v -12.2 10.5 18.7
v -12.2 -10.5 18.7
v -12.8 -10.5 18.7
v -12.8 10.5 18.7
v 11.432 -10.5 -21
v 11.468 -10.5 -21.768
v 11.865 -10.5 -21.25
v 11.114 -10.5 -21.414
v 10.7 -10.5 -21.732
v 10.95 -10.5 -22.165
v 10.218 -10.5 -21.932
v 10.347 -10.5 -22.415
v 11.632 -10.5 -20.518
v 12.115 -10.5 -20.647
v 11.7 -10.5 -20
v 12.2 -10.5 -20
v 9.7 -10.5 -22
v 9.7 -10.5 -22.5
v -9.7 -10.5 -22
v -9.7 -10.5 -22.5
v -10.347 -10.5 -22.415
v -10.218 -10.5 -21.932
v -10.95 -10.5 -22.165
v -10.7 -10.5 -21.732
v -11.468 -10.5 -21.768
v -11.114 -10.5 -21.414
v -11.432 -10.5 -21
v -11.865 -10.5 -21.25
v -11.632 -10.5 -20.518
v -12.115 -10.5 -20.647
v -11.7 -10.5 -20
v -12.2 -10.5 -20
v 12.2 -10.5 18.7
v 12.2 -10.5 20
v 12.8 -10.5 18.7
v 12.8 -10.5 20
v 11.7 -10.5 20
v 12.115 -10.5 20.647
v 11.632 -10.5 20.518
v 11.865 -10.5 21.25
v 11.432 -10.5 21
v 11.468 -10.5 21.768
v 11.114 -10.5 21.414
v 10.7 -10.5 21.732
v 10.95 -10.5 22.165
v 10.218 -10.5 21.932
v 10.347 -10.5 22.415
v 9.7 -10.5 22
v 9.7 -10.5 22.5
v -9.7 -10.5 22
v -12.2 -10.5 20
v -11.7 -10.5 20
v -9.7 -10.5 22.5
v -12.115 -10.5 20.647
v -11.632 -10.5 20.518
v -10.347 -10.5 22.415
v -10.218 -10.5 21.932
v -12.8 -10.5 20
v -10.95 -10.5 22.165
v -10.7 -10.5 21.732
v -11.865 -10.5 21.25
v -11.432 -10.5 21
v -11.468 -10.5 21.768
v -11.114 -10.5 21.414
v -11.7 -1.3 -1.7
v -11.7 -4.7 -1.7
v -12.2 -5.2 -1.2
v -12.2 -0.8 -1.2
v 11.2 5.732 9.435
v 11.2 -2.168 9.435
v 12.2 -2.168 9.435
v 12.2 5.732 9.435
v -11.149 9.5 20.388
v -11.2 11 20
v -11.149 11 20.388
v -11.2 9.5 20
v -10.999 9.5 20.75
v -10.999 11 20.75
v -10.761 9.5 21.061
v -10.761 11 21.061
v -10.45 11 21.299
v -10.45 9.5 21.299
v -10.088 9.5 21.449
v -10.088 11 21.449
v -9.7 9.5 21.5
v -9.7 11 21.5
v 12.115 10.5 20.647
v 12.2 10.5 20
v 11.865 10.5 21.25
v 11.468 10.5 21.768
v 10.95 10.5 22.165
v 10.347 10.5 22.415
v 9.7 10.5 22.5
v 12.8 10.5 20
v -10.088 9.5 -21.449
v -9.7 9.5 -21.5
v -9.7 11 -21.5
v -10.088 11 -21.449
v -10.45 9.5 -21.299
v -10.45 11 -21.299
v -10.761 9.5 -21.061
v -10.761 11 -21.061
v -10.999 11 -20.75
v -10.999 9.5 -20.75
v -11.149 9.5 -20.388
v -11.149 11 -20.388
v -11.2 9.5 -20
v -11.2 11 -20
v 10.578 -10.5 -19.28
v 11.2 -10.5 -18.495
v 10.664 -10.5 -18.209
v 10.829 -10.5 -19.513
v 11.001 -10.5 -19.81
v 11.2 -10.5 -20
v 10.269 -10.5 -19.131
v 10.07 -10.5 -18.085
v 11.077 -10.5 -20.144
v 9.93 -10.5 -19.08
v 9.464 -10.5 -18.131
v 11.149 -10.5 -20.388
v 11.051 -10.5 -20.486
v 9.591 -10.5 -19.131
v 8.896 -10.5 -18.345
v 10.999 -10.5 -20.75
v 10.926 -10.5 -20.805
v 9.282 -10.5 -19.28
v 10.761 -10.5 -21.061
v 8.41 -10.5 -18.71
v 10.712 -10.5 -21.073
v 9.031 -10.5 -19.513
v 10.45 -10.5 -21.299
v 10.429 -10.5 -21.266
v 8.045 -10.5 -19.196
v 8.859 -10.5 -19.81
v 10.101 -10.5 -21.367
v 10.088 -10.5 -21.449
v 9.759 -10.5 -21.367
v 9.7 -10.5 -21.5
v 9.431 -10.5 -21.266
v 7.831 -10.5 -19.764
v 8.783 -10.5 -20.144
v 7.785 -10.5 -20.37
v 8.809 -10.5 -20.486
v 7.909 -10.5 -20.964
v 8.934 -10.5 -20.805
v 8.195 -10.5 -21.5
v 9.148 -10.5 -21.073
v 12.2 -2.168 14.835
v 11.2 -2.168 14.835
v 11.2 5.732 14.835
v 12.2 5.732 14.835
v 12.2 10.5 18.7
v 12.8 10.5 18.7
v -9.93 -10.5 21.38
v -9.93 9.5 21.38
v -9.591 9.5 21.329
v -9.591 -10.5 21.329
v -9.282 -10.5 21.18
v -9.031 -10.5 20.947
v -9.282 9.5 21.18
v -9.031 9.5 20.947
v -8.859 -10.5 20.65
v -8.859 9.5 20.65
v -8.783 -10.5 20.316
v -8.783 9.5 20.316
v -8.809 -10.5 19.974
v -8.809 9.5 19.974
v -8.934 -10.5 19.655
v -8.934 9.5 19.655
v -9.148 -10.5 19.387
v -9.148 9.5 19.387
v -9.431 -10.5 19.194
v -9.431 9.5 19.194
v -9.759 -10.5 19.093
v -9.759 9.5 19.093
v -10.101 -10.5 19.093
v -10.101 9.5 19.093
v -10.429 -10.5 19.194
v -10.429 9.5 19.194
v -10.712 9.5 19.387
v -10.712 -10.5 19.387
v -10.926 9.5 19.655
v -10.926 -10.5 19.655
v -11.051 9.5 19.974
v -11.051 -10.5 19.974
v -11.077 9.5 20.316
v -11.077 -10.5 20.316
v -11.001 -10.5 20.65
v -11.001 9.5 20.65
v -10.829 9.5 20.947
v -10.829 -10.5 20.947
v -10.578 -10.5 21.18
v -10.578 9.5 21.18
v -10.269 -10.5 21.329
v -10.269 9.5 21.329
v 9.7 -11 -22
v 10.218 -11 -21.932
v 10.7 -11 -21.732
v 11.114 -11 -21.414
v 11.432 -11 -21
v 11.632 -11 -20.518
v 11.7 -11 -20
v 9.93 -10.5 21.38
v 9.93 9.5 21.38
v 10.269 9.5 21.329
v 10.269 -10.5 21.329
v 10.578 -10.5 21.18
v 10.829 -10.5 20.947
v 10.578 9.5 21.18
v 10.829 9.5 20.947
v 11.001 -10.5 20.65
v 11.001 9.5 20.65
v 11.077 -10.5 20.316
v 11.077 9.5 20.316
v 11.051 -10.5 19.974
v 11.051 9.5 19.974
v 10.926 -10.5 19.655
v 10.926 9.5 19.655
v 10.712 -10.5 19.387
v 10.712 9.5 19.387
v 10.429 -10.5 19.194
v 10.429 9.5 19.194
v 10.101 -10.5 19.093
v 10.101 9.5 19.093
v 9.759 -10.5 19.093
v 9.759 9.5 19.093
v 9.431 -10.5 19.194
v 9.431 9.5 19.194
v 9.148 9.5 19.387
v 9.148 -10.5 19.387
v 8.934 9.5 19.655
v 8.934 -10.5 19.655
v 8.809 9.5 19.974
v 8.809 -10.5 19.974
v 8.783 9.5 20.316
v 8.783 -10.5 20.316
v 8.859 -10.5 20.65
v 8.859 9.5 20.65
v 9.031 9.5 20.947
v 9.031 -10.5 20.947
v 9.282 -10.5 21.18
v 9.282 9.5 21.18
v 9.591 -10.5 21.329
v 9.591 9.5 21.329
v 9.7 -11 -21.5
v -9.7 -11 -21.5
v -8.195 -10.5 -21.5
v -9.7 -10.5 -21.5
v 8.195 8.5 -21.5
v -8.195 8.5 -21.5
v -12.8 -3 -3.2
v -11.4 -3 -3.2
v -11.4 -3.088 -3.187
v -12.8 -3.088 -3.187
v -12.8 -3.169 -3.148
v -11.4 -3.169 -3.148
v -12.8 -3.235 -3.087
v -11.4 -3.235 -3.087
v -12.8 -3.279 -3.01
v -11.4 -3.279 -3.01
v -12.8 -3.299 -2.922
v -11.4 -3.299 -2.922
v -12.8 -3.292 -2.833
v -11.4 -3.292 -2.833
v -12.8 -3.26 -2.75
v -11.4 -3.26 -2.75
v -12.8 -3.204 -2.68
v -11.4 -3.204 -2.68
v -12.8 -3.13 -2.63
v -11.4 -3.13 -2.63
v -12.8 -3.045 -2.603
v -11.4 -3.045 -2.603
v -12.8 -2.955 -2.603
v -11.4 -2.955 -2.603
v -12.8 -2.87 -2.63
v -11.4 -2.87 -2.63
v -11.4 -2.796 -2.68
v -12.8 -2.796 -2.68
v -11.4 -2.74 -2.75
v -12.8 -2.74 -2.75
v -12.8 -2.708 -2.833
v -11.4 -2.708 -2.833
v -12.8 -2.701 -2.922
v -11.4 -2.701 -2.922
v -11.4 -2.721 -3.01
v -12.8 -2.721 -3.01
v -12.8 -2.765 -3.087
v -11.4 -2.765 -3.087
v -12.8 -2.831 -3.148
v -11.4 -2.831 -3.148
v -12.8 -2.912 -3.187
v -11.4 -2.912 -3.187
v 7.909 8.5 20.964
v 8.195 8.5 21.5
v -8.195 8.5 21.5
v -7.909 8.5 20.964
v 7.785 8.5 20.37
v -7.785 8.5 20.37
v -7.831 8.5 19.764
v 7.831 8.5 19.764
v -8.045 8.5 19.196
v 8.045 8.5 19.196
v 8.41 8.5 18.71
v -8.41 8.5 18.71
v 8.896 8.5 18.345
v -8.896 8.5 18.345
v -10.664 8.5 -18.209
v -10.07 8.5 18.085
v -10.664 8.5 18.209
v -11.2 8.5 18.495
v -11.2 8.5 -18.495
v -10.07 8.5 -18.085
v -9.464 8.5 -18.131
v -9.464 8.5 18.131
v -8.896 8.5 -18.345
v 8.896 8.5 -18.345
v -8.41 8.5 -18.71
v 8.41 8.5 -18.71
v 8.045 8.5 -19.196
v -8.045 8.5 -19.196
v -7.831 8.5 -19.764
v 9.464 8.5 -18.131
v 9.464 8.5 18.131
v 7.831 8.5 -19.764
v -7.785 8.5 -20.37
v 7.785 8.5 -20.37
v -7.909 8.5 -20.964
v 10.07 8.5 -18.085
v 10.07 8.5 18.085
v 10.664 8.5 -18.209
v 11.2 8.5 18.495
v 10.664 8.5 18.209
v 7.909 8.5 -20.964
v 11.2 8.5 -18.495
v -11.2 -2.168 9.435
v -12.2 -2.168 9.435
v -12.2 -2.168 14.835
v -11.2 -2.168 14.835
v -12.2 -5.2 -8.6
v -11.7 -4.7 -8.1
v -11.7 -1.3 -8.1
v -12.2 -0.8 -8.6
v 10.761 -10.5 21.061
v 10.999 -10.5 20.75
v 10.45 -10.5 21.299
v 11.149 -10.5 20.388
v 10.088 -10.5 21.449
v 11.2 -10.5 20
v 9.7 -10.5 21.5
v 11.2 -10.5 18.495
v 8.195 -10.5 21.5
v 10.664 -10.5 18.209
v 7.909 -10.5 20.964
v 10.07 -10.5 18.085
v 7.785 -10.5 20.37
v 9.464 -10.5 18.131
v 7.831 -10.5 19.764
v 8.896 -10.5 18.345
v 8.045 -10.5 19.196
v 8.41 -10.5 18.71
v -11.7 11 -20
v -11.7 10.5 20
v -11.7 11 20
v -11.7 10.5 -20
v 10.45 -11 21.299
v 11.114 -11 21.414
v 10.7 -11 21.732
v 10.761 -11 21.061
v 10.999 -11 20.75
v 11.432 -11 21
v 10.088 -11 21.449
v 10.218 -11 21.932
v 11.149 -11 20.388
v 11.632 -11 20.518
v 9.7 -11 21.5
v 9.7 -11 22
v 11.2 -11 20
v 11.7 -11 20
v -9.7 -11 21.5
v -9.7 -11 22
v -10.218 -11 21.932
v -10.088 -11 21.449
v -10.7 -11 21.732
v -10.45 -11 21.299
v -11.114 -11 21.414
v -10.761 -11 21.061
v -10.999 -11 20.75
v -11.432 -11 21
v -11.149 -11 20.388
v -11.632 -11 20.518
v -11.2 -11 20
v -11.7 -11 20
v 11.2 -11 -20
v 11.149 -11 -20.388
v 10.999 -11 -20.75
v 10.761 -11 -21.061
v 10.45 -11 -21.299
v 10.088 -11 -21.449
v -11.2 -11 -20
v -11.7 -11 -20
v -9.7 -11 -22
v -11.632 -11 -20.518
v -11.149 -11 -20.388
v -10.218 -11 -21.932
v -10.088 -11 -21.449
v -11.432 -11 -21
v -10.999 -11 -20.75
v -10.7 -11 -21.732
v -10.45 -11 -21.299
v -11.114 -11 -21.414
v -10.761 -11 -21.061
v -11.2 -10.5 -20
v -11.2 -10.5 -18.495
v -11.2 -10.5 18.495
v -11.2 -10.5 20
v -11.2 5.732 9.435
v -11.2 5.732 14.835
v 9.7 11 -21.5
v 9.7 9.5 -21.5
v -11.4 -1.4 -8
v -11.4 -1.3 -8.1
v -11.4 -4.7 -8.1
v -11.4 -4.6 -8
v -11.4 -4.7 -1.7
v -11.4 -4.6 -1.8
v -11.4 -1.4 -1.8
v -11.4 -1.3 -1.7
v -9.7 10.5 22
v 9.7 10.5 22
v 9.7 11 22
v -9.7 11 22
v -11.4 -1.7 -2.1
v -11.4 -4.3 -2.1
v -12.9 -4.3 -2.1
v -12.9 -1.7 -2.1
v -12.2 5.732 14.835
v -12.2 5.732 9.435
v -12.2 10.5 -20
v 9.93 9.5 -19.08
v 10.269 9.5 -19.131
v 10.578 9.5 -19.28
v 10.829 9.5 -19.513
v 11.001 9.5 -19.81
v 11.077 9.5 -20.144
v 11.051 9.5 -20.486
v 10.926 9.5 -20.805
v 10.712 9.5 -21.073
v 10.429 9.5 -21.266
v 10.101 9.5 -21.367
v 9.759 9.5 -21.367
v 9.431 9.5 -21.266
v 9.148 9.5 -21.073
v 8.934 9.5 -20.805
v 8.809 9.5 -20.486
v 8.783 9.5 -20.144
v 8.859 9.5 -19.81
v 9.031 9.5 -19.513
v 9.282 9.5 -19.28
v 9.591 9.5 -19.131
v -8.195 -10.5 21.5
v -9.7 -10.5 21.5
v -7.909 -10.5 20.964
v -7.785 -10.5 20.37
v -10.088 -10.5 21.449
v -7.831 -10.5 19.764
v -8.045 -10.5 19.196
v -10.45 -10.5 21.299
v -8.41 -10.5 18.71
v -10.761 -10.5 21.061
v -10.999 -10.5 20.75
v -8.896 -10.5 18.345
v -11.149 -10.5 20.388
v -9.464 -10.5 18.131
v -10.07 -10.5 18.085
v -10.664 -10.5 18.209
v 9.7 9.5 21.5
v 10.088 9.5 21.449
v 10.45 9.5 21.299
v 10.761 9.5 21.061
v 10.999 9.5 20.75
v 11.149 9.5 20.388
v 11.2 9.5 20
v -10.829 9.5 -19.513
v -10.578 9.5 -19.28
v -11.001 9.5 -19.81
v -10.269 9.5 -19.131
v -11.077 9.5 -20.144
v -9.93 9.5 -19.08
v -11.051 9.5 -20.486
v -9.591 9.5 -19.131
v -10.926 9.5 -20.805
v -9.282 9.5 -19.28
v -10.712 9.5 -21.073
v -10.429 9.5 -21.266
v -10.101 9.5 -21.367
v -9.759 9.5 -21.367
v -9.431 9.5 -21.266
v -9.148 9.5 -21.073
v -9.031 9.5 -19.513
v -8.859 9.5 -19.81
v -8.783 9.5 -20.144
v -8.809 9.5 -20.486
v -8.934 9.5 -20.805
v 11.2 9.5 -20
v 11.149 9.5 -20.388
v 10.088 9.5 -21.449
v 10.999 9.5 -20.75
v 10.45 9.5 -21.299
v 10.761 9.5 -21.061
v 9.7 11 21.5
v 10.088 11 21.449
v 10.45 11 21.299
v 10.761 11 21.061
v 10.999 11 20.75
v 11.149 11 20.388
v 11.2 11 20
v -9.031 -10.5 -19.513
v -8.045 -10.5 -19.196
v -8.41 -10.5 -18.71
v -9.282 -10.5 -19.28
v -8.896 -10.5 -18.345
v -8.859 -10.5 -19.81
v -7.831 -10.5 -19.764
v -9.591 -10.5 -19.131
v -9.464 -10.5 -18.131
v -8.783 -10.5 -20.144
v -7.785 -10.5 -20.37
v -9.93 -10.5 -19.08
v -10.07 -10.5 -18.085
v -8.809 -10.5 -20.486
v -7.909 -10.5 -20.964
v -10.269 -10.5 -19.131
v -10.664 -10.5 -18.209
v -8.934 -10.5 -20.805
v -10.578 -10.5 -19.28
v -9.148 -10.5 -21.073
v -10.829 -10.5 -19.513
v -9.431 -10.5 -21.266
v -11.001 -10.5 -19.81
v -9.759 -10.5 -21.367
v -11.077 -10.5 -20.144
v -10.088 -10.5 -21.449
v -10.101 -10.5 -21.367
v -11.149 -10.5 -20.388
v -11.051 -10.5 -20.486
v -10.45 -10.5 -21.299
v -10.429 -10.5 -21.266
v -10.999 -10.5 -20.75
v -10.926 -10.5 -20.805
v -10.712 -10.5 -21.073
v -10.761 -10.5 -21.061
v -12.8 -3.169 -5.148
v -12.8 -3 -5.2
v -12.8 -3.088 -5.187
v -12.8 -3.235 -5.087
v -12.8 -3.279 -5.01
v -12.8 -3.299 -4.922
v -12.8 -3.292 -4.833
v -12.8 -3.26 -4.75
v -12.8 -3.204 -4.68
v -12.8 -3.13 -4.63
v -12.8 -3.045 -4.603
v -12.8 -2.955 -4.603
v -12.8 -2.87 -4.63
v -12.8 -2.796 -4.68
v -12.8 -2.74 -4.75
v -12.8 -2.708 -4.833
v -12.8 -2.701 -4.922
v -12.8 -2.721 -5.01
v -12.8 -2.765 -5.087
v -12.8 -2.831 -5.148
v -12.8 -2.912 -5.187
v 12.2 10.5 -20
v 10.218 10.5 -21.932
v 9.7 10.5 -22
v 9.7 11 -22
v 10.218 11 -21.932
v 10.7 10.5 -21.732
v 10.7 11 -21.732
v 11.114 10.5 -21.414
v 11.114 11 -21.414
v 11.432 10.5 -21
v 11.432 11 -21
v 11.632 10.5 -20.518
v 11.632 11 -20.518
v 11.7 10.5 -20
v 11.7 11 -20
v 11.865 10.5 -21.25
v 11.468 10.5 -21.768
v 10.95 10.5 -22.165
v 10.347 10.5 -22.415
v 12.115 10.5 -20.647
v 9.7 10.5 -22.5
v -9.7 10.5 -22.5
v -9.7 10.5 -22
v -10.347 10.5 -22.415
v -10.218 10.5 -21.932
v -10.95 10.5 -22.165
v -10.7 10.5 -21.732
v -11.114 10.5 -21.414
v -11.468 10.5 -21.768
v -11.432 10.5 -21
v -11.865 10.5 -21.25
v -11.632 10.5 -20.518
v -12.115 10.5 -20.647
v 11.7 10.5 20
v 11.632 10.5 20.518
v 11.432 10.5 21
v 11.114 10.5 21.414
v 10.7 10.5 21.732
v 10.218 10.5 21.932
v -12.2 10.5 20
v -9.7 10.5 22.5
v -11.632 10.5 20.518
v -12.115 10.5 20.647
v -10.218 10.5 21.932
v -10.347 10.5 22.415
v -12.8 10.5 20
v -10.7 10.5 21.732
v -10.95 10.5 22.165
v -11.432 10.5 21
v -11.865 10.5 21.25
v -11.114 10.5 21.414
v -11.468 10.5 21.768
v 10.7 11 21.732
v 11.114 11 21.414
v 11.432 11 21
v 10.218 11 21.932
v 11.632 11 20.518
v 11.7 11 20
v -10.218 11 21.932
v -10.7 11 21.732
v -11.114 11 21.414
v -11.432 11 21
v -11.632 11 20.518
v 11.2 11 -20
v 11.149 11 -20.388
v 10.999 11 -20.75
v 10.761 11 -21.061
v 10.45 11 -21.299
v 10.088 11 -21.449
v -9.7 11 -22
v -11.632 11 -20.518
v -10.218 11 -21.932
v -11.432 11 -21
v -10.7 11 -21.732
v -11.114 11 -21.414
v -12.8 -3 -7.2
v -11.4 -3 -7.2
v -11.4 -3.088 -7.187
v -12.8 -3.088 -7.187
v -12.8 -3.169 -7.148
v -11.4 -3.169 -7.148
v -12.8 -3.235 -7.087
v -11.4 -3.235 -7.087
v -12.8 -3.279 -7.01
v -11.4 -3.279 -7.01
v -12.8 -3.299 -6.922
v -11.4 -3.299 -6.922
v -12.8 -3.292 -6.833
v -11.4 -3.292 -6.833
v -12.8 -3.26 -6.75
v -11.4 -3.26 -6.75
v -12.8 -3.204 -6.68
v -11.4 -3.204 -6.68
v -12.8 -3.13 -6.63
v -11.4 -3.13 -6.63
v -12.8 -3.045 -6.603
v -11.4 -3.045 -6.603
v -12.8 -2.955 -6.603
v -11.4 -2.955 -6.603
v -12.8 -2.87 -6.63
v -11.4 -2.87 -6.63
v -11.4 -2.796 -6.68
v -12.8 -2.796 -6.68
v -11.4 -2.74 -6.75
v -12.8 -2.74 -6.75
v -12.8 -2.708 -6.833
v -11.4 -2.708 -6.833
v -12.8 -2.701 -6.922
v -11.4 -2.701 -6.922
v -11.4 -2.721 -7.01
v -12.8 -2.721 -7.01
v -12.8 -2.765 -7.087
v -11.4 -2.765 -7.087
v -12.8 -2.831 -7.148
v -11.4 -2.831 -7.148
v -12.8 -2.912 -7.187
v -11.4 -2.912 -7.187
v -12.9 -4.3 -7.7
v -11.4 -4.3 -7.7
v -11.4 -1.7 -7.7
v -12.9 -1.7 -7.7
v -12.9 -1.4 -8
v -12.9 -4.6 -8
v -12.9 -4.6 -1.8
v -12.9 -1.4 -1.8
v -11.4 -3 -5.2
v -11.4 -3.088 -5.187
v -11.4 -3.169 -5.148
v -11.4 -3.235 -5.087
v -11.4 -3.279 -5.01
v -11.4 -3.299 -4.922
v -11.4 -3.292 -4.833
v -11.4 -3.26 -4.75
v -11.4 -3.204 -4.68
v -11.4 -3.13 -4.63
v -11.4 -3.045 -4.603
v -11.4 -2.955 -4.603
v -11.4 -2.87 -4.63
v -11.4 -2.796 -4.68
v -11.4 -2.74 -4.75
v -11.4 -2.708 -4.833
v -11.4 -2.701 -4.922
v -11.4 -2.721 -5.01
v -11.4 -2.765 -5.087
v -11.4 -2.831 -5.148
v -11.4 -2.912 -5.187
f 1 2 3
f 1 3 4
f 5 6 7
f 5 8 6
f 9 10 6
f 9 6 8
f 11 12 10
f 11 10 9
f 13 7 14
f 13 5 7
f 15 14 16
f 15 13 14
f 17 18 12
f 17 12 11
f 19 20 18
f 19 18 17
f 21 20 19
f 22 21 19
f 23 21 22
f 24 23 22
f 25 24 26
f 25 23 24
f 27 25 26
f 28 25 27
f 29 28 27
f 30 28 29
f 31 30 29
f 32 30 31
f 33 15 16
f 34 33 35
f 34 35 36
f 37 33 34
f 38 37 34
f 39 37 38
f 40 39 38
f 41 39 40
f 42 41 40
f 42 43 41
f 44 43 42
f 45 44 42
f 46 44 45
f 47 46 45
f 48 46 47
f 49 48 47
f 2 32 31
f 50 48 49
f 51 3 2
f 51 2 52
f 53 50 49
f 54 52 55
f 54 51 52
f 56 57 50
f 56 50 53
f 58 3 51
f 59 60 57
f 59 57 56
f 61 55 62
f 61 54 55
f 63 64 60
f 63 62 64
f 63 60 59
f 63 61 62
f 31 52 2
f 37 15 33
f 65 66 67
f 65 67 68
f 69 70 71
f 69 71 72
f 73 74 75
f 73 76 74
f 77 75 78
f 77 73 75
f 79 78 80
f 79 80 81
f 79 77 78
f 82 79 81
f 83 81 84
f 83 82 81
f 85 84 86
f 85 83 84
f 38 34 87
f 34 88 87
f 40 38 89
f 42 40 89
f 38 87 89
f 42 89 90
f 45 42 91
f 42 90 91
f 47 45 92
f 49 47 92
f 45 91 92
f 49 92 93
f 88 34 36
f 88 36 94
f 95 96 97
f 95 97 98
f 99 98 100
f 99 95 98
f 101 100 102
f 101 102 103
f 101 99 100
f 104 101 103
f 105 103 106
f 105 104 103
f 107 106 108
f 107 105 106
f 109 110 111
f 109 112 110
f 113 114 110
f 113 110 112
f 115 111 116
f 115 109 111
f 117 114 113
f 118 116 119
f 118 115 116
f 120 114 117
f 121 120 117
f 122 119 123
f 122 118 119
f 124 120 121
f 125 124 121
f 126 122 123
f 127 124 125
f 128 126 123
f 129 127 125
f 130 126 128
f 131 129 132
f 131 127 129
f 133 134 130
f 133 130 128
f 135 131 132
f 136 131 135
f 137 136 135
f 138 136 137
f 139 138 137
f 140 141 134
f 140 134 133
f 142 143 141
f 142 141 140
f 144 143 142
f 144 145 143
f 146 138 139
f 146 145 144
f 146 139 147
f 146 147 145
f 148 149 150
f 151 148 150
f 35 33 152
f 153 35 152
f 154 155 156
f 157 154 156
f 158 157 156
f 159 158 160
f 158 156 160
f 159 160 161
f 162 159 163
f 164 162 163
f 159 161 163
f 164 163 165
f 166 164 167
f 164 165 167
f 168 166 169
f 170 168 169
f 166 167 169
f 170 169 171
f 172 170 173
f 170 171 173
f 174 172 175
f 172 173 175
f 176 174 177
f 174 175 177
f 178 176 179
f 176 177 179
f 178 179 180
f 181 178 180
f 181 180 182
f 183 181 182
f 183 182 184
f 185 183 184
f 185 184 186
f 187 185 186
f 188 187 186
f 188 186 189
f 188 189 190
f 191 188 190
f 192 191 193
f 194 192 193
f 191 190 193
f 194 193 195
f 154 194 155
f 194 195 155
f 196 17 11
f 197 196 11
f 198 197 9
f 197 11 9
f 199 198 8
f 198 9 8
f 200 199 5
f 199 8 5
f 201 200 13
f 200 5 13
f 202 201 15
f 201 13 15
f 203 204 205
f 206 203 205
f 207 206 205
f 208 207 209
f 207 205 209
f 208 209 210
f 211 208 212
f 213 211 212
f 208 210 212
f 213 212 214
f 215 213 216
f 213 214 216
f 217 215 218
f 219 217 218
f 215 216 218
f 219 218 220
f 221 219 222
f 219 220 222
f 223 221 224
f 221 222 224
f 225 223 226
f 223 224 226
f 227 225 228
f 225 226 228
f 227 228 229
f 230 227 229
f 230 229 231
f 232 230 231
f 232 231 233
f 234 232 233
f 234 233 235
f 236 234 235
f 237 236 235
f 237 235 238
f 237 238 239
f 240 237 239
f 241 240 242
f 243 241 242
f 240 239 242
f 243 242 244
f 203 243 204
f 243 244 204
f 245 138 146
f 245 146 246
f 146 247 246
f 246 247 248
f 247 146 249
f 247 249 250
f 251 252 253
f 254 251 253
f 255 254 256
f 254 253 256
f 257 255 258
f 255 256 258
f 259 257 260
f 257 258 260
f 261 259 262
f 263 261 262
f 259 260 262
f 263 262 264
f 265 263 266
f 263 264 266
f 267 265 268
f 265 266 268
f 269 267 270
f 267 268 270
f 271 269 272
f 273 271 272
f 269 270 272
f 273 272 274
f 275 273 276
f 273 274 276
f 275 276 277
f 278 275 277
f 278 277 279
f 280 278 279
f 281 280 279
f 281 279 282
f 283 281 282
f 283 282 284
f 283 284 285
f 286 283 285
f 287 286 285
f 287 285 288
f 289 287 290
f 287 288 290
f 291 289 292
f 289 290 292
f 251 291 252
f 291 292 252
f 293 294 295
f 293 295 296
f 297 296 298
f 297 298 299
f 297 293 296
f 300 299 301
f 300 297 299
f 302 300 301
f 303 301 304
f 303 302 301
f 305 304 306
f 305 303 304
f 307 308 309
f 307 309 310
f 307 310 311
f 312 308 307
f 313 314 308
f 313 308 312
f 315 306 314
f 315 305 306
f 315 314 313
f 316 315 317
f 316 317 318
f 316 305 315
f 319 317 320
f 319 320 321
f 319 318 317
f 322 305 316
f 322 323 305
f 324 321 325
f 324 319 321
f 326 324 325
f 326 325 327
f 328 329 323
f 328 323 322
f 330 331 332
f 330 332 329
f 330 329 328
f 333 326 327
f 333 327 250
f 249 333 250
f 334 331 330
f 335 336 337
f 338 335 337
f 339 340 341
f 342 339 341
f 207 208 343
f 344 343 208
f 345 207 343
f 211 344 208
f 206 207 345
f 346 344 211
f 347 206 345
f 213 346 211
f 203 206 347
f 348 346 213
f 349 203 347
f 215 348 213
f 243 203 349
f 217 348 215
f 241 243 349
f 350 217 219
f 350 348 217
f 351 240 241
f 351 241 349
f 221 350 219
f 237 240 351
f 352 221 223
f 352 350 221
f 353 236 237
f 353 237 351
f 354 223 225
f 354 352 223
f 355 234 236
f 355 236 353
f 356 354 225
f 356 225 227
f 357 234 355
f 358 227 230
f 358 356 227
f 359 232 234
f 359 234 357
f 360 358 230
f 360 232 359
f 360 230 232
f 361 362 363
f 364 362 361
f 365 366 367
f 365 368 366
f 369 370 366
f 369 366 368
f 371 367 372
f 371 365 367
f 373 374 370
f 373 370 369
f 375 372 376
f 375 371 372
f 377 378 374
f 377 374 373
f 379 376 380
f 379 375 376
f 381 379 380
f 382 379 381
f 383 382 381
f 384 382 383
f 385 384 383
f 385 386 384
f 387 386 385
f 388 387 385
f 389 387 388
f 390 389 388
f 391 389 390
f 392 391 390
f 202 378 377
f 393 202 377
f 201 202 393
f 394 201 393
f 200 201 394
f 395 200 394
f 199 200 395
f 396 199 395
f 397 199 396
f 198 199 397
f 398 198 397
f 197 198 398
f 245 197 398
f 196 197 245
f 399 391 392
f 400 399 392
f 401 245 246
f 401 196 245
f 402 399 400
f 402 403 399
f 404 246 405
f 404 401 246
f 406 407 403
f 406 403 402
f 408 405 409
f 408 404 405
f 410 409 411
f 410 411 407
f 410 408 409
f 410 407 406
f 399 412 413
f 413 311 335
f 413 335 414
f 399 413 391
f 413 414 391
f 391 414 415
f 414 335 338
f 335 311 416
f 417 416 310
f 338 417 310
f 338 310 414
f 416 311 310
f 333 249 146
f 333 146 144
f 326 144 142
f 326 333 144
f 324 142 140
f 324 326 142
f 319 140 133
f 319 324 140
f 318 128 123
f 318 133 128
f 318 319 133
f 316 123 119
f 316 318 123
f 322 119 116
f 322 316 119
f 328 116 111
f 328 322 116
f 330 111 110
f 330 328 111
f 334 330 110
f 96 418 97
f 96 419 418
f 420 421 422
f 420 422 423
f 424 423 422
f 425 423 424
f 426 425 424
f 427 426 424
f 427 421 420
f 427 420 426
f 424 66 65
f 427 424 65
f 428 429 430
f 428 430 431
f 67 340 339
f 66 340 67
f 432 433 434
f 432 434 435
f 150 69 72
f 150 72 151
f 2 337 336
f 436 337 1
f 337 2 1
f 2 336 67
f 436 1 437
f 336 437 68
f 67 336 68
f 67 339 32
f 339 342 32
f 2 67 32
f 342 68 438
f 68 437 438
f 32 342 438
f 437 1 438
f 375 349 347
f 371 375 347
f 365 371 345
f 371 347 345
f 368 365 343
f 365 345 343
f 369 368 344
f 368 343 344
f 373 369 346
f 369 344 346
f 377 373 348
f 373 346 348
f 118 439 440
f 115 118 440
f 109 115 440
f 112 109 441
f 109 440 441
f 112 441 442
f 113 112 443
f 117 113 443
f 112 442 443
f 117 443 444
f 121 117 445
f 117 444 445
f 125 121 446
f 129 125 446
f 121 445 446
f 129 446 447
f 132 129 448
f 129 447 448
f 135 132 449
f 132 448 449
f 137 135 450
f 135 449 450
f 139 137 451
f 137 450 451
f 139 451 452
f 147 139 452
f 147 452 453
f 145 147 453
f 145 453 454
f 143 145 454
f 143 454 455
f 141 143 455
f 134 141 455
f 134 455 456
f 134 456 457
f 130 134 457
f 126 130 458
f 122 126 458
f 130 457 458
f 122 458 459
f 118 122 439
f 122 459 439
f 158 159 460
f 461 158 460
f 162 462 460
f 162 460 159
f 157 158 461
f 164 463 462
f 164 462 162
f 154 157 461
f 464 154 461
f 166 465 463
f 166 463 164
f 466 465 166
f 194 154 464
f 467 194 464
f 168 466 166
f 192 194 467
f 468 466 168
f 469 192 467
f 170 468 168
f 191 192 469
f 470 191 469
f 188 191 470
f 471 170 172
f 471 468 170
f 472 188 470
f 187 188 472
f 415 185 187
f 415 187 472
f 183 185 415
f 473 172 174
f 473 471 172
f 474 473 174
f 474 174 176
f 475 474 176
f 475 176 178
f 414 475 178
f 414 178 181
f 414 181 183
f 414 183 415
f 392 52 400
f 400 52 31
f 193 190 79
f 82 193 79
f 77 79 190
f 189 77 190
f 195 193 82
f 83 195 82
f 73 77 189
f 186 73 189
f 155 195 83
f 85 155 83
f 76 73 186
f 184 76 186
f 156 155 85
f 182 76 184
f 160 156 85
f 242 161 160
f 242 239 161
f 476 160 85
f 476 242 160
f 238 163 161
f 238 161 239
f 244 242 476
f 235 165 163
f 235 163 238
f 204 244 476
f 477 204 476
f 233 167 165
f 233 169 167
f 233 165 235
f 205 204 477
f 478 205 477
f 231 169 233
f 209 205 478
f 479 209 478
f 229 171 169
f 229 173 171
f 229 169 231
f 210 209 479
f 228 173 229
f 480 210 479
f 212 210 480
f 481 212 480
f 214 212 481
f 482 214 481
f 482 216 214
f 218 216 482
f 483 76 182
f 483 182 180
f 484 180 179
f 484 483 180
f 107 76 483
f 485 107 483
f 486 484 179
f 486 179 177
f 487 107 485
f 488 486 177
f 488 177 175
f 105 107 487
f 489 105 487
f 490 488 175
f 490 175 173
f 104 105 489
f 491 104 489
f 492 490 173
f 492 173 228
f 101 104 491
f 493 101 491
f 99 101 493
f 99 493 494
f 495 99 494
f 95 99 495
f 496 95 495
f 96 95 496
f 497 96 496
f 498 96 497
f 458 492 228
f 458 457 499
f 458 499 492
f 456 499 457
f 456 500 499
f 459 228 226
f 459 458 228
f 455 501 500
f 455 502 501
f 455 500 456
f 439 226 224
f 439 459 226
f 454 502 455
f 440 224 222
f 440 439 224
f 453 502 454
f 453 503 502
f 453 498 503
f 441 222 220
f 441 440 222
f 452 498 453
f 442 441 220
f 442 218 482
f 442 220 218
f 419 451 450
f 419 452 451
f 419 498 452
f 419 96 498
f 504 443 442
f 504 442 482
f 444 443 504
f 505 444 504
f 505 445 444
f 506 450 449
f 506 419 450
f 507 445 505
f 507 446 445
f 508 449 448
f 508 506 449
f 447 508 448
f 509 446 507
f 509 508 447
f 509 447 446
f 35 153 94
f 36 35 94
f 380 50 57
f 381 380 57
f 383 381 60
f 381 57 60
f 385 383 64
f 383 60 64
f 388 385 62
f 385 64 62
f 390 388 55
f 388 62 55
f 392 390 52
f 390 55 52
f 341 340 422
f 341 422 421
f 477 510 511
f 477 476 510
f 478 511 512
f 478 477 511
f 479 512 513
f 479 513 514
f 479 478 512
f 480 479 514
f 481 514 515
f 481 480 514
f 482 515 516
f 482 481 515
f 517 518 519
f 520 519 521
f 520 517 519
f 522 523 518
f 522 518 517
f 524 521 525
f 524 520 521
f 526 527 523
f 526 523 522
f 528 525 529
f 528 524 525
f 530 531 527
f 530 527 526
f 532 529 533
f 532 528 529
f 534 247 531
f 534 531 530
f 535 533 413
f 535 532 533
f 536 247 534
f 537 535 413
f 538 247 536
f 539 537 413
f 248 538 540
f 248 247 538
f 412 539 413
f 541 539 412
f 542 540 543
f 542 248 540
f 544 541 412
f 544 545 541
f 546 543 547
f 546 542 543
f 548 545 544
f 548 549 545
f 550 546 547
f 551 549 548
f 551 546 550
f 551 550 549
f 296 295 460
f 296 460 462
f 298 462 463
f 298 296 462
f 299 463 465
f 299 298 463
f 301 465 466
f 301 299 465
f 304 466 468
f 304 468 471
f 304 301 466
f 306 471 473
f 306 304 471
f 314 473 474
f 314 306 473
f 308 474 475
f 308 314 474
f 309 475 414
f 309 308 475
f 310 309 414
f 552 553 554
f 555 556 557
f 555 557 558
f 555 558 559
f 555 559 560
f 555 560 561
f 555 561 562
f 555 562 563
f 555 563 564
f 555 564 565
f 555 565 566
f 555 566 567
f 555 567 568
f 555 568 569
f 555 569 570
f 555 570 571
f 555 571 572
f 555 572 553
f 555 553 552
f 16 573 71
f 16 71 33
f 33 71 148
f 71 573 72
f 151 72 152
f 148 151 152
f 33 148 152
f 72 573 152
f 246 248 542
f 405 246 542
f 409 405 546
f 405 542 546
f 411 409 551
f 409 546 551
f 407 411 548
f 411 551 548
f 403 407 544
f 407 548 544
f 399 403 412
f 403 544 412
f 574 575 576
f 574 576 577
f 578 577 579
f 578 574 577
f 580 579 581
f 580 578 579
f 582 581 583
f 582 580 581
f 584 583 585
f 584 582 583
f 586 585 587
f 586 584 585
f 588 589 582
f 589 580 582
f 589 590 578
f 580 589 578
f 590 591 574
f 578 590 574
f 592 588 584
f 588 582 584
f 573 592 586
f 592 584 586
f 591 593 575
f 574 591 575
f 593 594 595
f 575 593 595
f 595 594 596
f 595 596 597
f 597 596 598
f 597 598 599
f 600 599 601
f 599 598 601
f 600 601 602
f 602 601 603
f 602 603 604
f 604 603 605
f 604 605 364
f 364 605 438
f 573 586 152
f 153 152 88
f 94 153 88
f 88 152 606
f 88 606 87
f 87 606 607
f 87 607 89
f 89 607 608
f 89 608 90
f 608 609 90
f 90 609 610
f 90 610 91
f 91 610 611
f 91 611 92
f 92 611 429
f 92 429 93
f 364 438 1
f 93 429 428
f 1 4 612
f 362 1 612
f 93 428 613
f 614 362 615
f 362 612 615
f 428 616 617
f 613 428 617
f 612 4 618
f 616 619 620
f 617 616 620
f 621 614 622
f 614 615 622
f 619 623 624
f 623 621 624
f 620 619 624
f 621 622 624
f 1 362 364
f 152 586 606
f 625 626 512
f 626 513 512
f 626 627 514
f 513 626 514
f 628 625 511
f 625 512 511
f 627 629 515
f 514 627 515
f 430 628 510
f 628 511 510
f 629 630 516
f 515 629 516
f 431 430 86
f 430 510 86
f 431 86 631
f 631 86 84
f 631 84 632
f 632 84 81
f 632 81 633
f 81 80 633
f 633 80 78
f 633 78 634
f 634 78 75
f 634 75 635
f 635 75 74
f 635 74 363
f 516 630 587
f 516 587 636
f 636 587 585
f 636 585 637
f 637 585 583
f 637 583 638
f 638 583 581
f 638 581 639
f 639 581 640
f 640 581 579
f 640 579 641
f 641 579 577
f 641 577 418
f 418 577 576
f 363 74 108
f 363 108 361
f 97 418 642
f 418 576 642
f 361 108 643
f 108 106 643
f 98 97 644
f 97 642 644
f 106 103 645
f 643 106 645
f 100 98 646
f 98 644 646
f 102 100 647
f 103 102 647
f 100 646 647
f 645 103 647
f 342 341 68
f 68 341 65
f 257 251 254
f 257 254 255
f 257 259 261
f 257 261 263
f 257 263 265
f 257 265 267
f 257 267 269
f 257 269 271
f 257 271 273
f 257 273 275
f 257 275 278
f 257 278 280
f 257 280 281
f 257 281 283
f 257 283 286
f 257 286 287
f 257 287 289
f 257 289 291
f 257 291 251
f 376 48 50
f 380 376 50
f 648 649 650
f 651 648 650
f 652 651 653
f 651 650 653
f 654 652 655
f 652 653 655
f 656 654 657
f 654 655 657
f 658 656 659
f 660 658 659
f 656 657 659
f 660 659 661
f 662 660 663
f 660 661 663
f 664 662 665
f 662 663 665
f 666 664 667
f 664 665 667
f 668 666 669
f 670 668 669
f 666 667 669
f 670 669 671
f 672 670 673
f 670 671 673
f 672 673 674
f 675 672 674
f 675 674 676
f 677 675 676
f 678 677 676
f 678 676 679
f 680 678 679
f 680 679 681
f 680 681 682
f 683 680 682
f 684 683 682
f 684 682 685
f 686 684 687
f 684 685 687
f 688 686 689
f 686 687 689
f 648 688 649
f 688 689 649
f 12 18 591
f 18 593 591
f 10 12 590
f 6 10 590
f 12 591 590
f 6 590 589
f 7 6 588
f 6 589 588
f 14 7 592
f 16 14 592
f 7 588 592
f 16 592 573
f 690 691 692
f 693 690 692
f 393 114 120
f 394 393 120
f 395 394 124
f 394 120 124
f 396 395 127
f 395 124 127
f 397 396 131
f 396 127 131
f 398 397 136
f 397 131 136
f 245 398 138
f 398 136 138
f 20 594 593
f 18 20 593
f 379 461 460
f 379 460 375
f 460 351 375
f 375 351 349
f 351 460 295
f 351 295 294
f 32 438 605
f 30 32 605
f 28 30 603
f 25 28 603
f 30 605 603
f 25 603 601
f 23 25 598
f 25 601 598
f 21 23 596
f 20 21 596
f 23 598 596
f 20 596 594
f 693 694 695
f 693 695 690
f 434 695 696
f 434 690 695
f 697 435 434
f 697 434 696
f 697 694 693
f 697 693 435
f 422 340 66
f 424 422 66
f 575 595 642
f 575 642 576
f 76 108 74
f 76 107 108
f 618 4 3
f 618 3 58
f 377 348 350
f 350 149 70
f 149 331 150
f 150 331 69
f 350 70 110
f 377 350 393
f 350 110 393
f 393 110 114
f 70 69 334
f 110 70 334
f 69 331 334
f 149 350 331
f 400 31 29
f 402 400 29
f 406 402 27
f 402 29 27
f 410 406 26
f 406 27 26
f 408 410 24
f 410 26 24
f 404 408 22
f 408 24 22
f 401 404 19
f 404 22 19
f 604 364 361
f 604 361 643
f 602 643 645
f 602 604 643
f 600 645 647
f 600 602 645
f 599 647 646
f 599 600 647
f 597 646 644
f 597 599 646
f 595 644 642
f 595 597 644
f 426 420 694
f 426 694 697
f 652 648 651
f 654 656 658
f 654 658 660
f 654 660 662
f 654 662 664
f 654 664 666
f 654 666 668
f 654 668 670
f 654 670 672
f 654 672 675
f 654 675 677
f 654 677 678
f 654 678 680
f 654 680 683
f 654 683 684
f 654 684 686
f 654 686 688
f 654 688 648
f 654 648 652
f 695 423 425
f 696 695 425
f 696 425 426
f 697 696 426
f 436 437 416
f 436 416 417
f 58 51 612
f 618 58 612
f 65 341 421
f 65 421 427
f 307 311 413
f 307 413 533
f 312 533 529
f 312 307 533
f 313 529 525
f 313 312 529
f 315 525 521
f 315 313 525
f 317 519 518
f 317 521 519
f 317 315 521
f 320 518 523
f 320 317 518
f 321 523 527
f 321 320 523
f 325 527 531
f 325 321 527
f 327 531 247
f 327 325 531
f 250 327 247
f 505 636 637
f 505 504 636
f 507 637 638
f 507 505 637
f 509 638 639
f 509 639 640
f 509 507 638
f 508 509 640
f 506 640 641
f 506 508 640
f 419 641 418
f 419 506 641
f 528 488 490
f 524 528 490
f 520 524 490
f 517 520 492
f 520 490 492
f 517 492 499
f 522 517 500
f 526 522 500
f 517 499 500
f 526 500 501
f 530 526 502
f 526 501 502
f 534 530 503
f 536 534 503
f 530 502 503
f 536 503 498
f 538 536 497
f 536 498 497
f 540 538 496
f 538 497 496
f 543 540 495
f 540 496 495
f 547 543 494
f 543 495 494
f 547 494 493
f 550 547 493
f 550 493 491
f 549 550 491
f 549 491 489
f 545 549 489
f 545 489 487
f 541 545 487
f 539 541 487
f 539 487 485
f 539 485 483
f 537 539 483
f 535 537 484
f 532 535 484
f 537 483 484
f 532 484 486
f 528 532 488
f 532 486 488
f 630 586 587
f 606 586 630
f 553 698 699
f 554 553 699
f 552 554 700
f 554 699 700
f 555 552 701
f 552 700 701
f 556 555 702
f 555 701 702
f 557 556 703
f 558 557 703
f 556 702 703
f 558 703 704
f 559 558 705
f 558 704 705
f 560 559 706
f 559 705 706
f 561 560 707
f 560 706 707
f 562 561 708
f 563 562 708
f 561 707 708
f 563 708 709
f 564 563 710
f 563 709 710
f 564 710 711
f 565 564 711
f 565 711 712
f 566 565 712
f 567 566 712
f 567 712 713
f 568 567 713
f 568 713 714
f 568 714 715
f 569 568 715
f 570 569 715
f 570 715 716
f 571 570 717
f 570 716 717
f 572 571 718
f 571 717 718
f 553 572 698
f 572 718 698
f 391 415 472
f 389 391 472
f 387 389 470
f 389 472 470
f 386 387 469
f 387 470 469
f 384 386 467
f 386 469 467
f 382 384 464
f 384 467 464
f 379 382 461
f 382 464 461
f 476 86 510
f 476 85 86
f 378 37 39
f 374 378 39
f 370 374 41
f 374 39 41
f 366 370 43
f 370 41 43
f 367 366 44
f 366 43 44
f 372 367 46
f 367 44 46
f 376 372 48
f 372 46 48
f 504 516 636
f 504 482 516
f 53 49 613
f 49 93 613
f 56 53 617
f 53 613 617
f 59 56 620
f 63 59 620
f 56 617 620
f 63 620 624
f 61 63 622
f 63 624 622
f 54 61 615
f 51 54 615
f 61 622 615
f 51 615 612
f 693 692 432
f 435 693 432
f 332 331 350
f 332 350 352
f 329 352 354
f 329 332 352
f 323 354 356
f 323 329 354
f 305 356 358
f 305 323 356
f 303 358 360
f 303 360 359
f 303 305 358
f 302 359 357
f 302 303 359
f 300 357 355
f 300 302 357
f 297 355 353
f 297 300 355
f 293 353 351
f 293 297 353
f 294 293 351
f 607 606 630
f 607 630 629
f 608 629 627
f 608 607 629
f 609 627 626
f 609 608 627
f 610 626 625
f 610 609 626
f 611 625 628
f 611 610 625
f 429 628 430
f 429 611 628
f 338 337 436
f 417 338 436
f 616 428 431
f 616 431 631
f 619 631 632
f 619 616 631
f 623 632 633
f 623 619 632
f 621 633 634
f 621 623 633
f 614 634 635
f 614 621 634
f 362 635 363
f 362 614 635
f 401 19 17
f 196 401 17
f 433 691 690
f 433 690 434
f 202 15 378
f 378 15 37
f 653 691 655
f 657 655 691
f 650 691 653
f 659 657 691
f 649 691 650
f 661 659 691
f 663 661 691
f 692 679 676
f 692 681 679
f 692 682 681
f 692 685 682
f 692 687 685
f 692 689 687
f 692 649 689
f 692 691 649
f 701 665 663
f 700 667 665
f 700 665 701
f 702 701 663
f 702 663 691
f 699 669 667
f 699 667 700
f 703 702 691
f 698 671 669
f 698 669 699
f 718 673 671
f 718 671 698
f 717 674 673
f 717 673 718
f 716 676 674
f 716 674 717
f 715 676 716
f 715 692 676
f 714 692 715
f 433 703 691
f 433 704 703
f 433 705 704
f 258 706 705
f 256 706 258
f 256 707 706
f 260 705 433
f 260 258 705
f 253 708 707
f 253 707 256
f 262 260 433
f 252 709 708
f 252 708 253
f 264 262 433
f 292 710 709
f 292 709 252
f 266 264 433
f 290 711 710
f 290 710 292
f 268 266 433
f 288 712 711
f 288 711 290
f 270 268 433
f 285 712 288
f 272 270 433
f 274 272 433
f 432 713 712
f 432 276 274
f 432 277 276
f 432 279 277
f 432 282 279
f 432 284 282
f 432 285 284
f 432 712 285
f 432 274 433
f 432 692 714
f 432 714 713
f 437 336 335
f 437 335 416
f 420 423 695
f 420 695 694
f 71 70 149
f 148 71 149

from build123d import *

# Parameters (mm, degrees)
SALIENTE_EXTRUIR1_DEPTH           = 10.5
CORTAR_EXTRUIR2_REACH             = 29.665
CROQUIS1_6_R                      = 1.15
CORTAR_EXTRUIR2_DIRECTION_2_REACH = 29.665
VACIADO3_T                        = -1
VACIADO3_THICKNESS_2_DEPTH        = 1
SALIENTE_EXTRUIR2_START           = 10.5
SALIENTE_EXTRUIR2_DEPTH           = 0.5
CROQUIS4_R                        = 1.15
CORTAR_EXTRUIR3_DEPTH             = 1
CROQUIS5_W                        = 6.4
CROQUIS5_H                        = 3.4
CORTAR_EXTRUIR4_DEPTH             = 0.8
CHAFL_N2_SIZE                     = 0.5
SALIENTE_EXTRUIR3_START           = -0.8
CROQUIS5_3_W                      = 6.2
CROQUIS5_3_H                      = 3.2
CROQUIS5_3_W_2                    = 5.6
CROQUIS5_3_H_2                    = 2.6
SALIENTE_EXTRUIR3_DEPTH           = 1.5
CROQUIS5_4_W                      = 5.4
CROQUIS5_4_H                      = 7.9
CORTAR_EXTRUIR5_DEPTH             = 35.965840473
SALIENTE_EXTRUIR4_START           = -0.8
CROQUIS5_6_R                      = 0.3
SALIENTE_EXTRUIR4_DEPTH           = 1.4
CROQUIS5_7_W                      = 1.3
CROQUIS5_7_H                      = 21
SALIENTE_EXTRUIR5_DEPTH           = 0.6


with BuildPart() as part:
    # Croquis1 → Saliente-Extruir1 (new, symmetric)
    with BuildSketch(Plane(origin=(0, 0, 0), x_dir=(1, 0, 0), z_dir=(0, 1, 0))):
        with BuildLine():
            Line((-9.7, 22.5), (9.7, 22.5))
            ThreePointArc((9.7, 22.5), (11.467766953, 21.767766953), (12.2, 20))
            Line((12.2, 20), (12.2, -20))
            ThreePointArc((12.2, -20), (11.467766953, -21.767766953), (9.7, -22.5))
            Line((9.7, -22.5), (-9.7, -22.5))
            ThreePointArc((-9.7, -22.5), (-11.467766953, -21.767766953), (-12.2, -20))
            Line((-12.2, -20), (-12.2, 20))
            ThreePointArc((-12.2, 20), (-11.467766953, 21.767766953), (-9.7, 22.5))
        make_face()
    extrude(amount=SALIENTE_EXTRUIR1_DEPTH, both=True)

    # Croquis1<6> → Cortar-Extruir2 (cut, up to next)
    with BuildSketch(Plane(origin=(0, 0, 0), x_dir=(1, 0, 0), z_dir=(0, 1, 0)), mode=Mode.PRIVATE) as cortar_extruir2_sk1:
        with Locations(Location((-9.93, 20.23, 0), (0, 0, 270))):
            Circle(CROQUIS1_6_R)
    cortar_extruir2_tool1 = extrude(cortar_extruir2_sk1.sketch, amount=-CORTAR_EXTRUIR2_REACH, mode=Mode.PRIVATE) & part.part
    # Croquis1<6> → Cortar-Extruir2 (cut, up to next)
    with BuildSketch(Plane(origin=(0, 0, 0), x_dir=(1, 0, 0), z_dir=(0, 1, 0)), mode=Mode.PRIVATE) as cortar_extruir2_sk2:
        with Locations(Location((9.93, 20.23, 0), (0, 0, 270))):
            Circle(CROQUIS1_6_R)
    cortar_extruir2_tool2 = extrude(cortar_extruir2_sk2.sketch, amount=-CORTAR_EXTRUIR2_REACH, mode=Mode.PRIVATE) & part.part
    # Croquis1<6> → Cortar-Extruir2 (cut, up to next)
    with BuildSketch(Plane(origin=(0, 0, 0), x_dir=(1, 0, 0), z_dir=(0, 1, 0)), mode=Mode.PRIVATE) as cortar_extruir2_sk3:
        with Locations(Location((-9.93, -20.23, 0), (0, 0, 270))):
            Circle(CROQUIS1_6_R)
    cortar_extruir2_tool3 = extrude(cortar_extruir2_sk3.sketch, amount=-CORTAR_EXTRUIR2_REACH, mode=Mode.PRIVATE) & part.part
    # Croquis1<6> → Cortar-Extruir2 (cut, up to next)
    with BuildSketch(Plane(origin=(0, 0, 0), x_dir=(1, 0, 0), z_dir=(0, 1, 0)), mode=Mode.PRIVATE) as cortar_extruir2_sk4:
        with Locations(Location((9.93, -20.23, 0), (0, 0, 270))):
            Circle(CROQUIS1_6_R)
    cortar_extruir2_tool4 = extrude(cortar_extruir2_sk4.sketch, amount=-CORTAR_EXTRUIR2_REACH, mode=Mode.PRIVATE) & part.part
    add(cortar_extruir2_tool1.solids().sort_by_distance((-9.93, 0, -20.23))[0], mode=Mode.SUBTRACT)
    add(cortar_extruir2_tool2.solids().sort_by_distance((9.93, 0, -20.23))[0], mode=Mode.SUBTRACT)
    add(cortar_extruir2_tool3.solids().sort_by_distance((-9.93, 0, 20.23))[0], mode=Mode.SUBTRACT)
    add(cortar_extruir2_tool4.solids().sort_by_distance((9.93, 0, 20.23))[0], mode=Mode.SUBTRACT)

    # Croquis1<6> → Cortar-Extruir2 direction 2 (cut, up to next)
    with BuildSketch(Plane(origin=(0, 0, 0), x_dir=(1, 0, 0), z_dir=(0, 1, 0)), mode=Mode.PRIVATE) as cortar_extruir2_direction_2_sk1:
        with Locations(Location((-9.93, 20.23, 0), (0, 0, 270))):
            Circle(CROQUIS1_6_R)
    cortar_extruir2_direction_2_tool1 = extrude(cortar_extruir2_direction_2_sk1.sketch, amount=CORTAR_EXTRUIR2_DIRECTION_2_REACH, mode=Mode.PRIVATE) & part.part
    # Croquis1<6> → Cortar-Extruir2 direction 2 (cut, up to next)
    with BuildSketch(Plane(origin=(0, 0, 0), x_dir=(1, 0, 0), z_dir=(0, 1, 0)), mode=Mode.PRIVATE) as cortar_extruir2_direction_2_sk2:
        with Locations(Location((9.93, 20.23, 0), (0, 0, 270))):
            Circle(CROQUIS1_6_R)
    cortar_extruir2_direction_2_tool2 = extrude(cortar_extruir2_direction_2_sk2.sketch, amount=CORTAR_EXTRUIR2_DIRECTION_2_REACH, mode=Mode.PRIVATE) & part.part
    # Croquis1<6> → Cortar-Extruir2 direction 2 (cut, up to next)
    with BuildSketch(Plane(origin=(0, 0, 0), x_dir=(1, 0, 0), z_dir=(0, 1, 0)), mode=Mode.PRIVATE) as cortar_extruir2_direction_2_sk3:
        with Locations(Location((-9.93, -20.23, 0), (0, 0, 270))):
            Circle(CROQUIS1_6_R)
    cortar_extruir2_direction_2_tool3 = extrude(cortar_extruir2_direction_2_sk3.sketch, amount=CORTAR_EXTRUIR2_DIRECTION_2_REACH, mode=Mode.PRIVATE) & part.part
    # Croquis1<6> → Cortar-Extruir2 direction 2 (cut, up to next)
    with BuildSketch(Plane(origin=(0, 0, 0), x_dir=(1, 0, 0), z_dir=(0, 1, 0)), mode=Mode.PRIVATE) as cortar_extruir2_direction_2_sk4:
        with Locations(Location((9.93, -20.23, 0), (0, 0, 270))):
            Circle(CROQUIS1_6_R)
    cortar_extruir2_direction_2_tool4 = extrude(cortar_extruir2_direction_2_sk4.sketch, amount=CORTAR_EXTRUIR2_DIRECTION_2_REACH, mode=Mode.PRIVATE) & part.part
    add(cortar_extruir2_direction_2_tool1.solids().sort_by_distance((-9.93, 0, -20.23))[0], mode=Mode.SUBTRACT)
    add(cortar_extruir2_direction_2_tool2.solids().sort_by_distance((9.93, 0, -20.23))[0], mode=Mode.SUBTRACT)
    add(cortar_extruir2_direction_2_tool3.solids().sort_by_distance((-9.93, 0, 20.23))[0], mode=Mode.SUBTRACT)
    add(cortar_extruir2_direction_2_tool4.solids().sort_by_distance((9.93, 0, 20.23))[0], mode=Mode.SUBTRACT)

    # Vaciado3
    vaciado3_openings = [part.faces().sort_by_distance(p)[0] for p in [
        (0, -10.5, 0),
    ]]
    offset(amount=VACIADO3_T, openings=vaciado3_openings, kind=Kind.INTERSECTION)

    # Vaciado3 thickness 2 face (on inner face of the shell) → Vaciado3 thickness 2 (add)
    with BuildSketch(Plane.ZX.offset(9.5)):
        with BuildLine():
            Line((-21.5, -8.195180125), (-21.5, 8.195180125))
            ThreePointArc((-21.5, 8.195180125), (-18.70972042, 8.40972042), (-18.495180125, 11.2))
            Line((-18.495180125, 11.2), (18.495180125, 11.2))
            ThreePointArc((18.495180125, 11.2), (18.70972042, 8.40972042), (21.5, 8.195180125))
            Line((21.5, 8.195180125), (21.5, -8.195180125))
            ThreePointArc((21.5, -8.195180125), (18.70972042, -8.40972042), (18.495180125, -11.2))
            Line((18.495180125, -11.2), (-18.495180125, -11.2))
            ThreePointArc((-18.495180125, -11.2), (-18.70972042, -8.40972042), (-21.5, -8.195180125))
        make_face()
    extrude(amount=-VACIADO3_THICKNESS_2_DEPTH)

    # Croquis1<4> → Saliente-Extruir2 (add)
    with BuildSketch(Plane(origin=(0, 0, 0), x_dir=(1, 0, 0), z_dir=(0, 1, 0)).offset(SALIENTE_EXTRUIR2_START)):
        with BuildLine():
            ThreePointArc((9.7, 22), (11.114213562, 21.414213562), (11.7, 20))
            Line((11.7, 20), (11.7, -20))
            ThreePointArc((11.7, -20), (11.114213562, -21.414213562), (9.7, -22))
            Line((9.7, -22), (-9.7, -22))
            ThreePointArc((-9.7, -22), (-11.114213562, -21.414213562), (-11.7, -20))
            Line((-11.7, -20), (-11.7, 20))
            ThreePointArc((-11.7, 20), (-11.114213562, 21.414213562), (-9.7, 22))
            Line((-9.7, 22), (9.7, 22))
        make_face()
        with BuildLine():
            ThreePointArc((-9.7, 21.5), (-10.760660172, 21.060660172), (-11.2, 20))
            Line((-11.2, 20), (-11.2, -20))
            ThreePointArc((-11.2, -20), (-10.760660172, -21.060660172), (-9.7, -21.5))
            Line((-9.7, -21.5), (9.7, -21.5))
            ThreePointArc((9.7, -21.5), (10.760660172, -21.060660172), (11.2, -20))
            Line((11.2, -20), (11.2, 20))
            ThreePointArc((11.2, 20), (10.760660172, 21.060660172), (9.7, 21.5))
            Line((9.7, 21.5), (-9.7, 21.5))
        make_face(mode=Mode.SUBTRACT)
    saliente_extruir2 = extrude(amount=SALIENTE_EXTRUIR2_DEPTH)

    # Simetría3: Saliente-Extruir2 across plane
    add(saliente_extruir2.mirror(Plane.ZX))

    # Croquis4 → Cortar-Extruir3 (cut)
    with BuildSketch(Plane(origin=(0, 10.5, 0), x_dir=(1, 0, 0), z_dir=(0, 1, 0))):
        with BuildLine():
            Line((11.2, -20), (11.2, 20))
            ThreePointArc((11.2, 20), (10.760660172, 21.060660172), (9.7, 21.5))
            Line((9.7, 21.5), (-9.7, 21.5))
            ThreePointArc((-9.7, 21.5), (-10.760660172, 21.060660172), (-11.2, 20))
            Line((-11.2, 20), (-11.2, -20))
            ThreePointArc((-11.2, -20), (-10.760660172, -21.060660172), (-9.7, -21.5))
            Line((-9.7, -21.5), (9.7, -21.5))
            ThreePointArc((9.7, -21.5), (10.760660172, -21.060660172), (11.2, -20))
        make_face()
        with Locations(Location((-9.93, -20.23, 0), (0, 0, 270))):
            Circle(CROQUIS4_R, mode=Mode.SUBTRACT)
        with Locations(Location((9.93, -20.23, 0), (0, 0, 270))):
            Circle(CROQUIS4_R, mode=Mode.SUBTRACT)
        with Locations(Location((-9.93, 20.23, 0), (0, 0, 270))):
            Circle(CROQUIS4_R, mode=Mode.SUBTRACT)
        with Locations(Location((9.93, 20.23, 0), (0, 0, 270))):
            Circle(CROQUIS4_R, mode=Mode.SUBTRACT)
    extrude(amount=-CORTAR_EXTRUIR3_DEPTH, mode=Mode.SUBTRACT)

    # Croquis5 → Cortar-Extruir4 (cut)
    with BuildSketch(Plane.ZY.offset(12.2)):
        with Locations((-4.9, -3)):
            Rectangle(CROQUIS5_W, CROQUIS5_H)
    extrude(amount=-CORTAR_EXTRUIR4_DEPTH, mode=Mode.SUBTRACT)

    # Chaflán2
    chafl_n2_edges = [part.edges().sort_by_distance(p)[0] for p in [
        (-12.2, -4.7, -4.9),
        (-12.2, -3, -8.1),
        (-12.2, -3, -1.7),
        (-12.2, -1.3, -4.9),
    ]]
    chamfer(chafl_n2_edges, length=CHAFL_N2_SIZE)

    # Croquis5<4> → Cortar-Extruir5 (cut, through all)
    with BuildSketch(Plane.ZY.offset(12.2)):
        with Locations((12.135332852, 1.782001246)):
            Rectangle(CROQUIS5_4_W, CROQUIS5_4_H)
    extrude(amount=-CORTAR_EXTRUIR5_DEPTH, mode=Mode.SUBTRACT)


with BuildPart() as body_2:
    # Croquis5<3> → Saliente-Extruir3 (new body)
    with BuildSketch(Plane.ZY.offset(12.2).offset(SALIENTE_EXTRUIR3_START)):
        with Locations((-4.9, -3)):
            Rectangle(CROQUIS5_3_W, CROQUIS5_3_H)
        with Locations((-4.9, -3)):
            Rectangle(CROQUIS5_3_W_2, CROQUIS5_3_H_2, mode=Mode.SUBTRACT)
    extrude(amount=SALIENTE_EXTRUIR3_DEPTH)


    add(part.part)  # Saliente-Extruir4 merges part
    # Croquis5<6> → Saliente-Extruir4 (add)
    with BuildSketch(Plane.ZY.offset(12.2).offset(SALIENTE_EXTRUIR4_START)):
        with Locations(Location((-6.9, -3, 0), (0, 0, 180))):
            Circle(CROQUIS5_6_R)
        with Locations(Location((-4.9, -3, 0), (0, 0, 180))):
            Circle(CROQUIS5_6_R)
        with Locations(Location((-2.9, -3, 0), (0, 0, 180))):
            Circle(CROQUIS5_6_R)
    extrude(amount=SALIENTE_EXTRUIR4_DEPTH)

    # Croquis5<7> → Saliente-Extruir5 (add)
    with BuildSketch(Plane.ZY.offset(12.2)):
        with Locations((19.35, 0)):
            Rectangle(CROQUIS5_7_W, CROQUIS5_7_H)
    saliente_extruir5 = extrude(amount=SALIENTE_EXTRUIR5_DEPTH)

    # Simetría4: Saliente-Extruir5 across plane
    add(saliente_extruir5.mirror(Plane(origin=(0, 0, 0), x_dir=(0, 0, 1), z_dir=(1, 0, 0))))


solid = body_2.part
